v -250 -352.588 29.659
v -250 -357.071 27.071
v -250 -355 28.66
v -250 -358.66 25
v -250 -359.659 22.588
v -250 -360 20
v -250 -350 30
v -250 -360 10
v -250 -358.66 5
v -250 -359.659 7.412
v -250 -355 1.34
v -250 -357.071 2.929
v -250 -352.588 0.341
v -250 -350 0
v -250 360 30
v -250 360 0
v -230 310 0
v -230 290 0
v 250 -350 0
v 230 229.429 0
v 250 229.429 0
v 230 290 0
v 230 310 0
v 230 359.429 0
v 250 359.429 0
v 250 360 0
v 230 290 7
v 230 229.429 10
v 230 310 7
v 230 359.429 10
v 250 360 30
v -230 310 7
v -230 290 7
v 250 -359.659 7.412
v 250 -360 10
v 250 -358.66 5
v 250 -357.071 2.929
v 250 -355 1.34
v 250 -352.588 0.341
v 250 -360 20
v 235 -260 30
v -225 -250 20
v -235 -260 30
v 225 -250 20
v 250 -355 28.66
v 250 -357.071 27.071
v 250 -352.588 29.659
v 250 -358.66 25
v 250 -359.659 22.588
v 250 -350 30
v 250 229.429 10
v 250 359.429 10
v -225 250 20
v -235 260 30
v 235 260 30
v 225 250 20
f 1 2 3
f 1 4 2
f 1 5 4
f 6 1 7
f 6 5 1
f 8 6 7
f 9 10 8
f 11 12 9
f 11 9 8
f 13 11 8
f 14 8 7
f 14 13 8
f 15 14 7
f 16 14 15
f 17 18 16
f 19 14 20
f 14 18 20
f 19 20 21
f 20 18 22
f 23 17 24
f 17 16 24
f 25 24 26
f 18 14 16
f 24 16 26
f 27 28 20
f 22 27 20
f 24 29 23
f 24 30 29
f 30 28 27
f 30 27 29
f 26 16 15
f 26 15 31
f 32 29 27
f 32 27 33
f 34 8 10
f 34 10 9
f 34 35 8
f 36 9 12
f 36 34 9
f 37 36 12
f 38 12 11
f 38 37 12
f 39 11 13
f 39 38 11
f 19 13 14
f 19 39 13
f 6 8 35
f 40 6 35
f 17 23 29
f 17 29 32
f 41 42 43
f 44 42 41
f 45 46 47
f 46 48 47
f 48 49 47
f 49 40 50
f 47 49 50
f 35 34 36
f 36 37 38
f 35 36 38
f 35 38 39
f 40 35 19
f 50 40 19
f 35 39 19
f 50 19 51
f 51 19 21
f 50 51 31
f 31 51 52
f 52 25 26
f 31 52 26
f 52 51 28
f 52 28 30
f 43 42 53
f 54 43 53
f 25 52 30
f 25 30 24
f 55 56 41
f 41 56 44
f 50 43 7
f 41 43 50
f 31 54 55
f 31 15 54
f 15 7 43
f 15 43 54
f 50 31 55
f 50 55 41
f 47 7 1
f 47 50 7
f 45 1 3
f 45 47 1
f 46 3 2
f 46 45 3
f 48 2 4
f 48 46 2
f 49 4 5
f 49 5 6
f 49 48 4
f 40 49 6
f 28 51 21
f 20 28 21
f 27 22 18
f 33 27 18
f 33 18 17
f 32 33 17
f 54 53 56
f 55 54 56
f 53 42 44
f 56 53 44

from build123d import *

# Parameters (mm, degrees)
CROQUIS1_W              = 500
CROQUIS1_H              = 720
SALIENTE_EXTRUIR1_DEPTH = 30
CROQUIS2_W              = 450
CROQUIS2_H              = 500
CORTAR_EXTRUIR1_DEPTH   = 10
CHAFL_N1_SIZE           = 10
CHAFL_N2_SIZE           = 10
REDONDEO2_R             = 10
REDONDEO3_R             = 10
CROQUIS11_W             = 480
CROQUIS11_H             = 20
CORTAR_EXTRUIR5_DEPTH   = 7
CROQUIS12_W             = 10
CROQUIS12_H             = 130
CORTAR_EXTRUIR6_DEPTH   = 20


with BuildPart() as part:
    # Croquis1 → Saliente-Extruir1 (new body)
    with BuildSketch(Plane.XY):
        Rectangle(CROQUIS1_W, CROQUIS1_H)
    extrude(amount=SALIENTE_EXTRUIR1_DEPTH)

    # Croquis2 → Cortar-Extruir1 (cut)
    with BuildSketch(Plane.XY.offset(30)):
        Rectangle(CROQUIS2_W, CROQUIS2_H)
    extrude(amount=-CORTAR_EXTRUIR1_DEPTH, mode=Mode.SUBTRACT)

    # Chaflán1
    chafl_n1_edges = [part.edges().sort_by_distance(p)[0] for p in [
        (0, 250, 30),
    ]]
    chamfer(chafl_n1_edges, length=CHAFL_N1_SIZE - 0.0001)  # a hair under: the kernel refuses the full size

    # Chaflán2
    chafl_n2_edges = [part.edges().sort_by_distance(p)[0] for p in [
        (225, 4.99995, 30),
        (0, -250, 30),
        (-225, 4.99995, 30),
    ]]
    chamfer(chafl_n2_edges, length=CHAFL_N2_SIZE - 0.0001)  # a hair under: the kernel refuses the full size

    # Redondeo2
    redondeo2_edges = [part.edges().sort_by_distance(p)[0] for p in [
        (0, -360, 30),
    ]]
    fillet(redondeo2_edges, radius=REDONDEO2_R)

    # Redondeo3
    redondeo3_edges = [part.edges().sort_by_distance(p)[0] for p in [
        (0, -360, 0),
    ]]
    fillet(redondeo3_edges, radius=REDONDEO3_R)

    # Croquis11 → Cortar-Extruir5 (cut)
    with BuildSketch(Plane(origin=(0, 0, 0), x_dir=(-1, 0, 0), z_dir=(0, 0, -1))):
        with Locations((-10, 300)):
            Rectangle(CROQUIS11_W, CROQUIS11_H)
    extrude(amount=-CORTAR_EXTRUIR5_DEPTH, mode=Mode.SUBTRACT)

    # Croquis12 → Cortar-Extruir6 (cut)
    with BuildSketch(Plane(origin=(250, 0, 0), x_dir=(0, 0, -1), z_dir=(1, 0, 0))):
        with Locations((-5, 294.429232032)):
            Rectangle(CROQUIS12_W, CROQUIS12_H)
    extrude(amount=-CORTAR_EXTRUIR6_DEPTH, mode=Mode.SUBTRACT)


solid = part.part
